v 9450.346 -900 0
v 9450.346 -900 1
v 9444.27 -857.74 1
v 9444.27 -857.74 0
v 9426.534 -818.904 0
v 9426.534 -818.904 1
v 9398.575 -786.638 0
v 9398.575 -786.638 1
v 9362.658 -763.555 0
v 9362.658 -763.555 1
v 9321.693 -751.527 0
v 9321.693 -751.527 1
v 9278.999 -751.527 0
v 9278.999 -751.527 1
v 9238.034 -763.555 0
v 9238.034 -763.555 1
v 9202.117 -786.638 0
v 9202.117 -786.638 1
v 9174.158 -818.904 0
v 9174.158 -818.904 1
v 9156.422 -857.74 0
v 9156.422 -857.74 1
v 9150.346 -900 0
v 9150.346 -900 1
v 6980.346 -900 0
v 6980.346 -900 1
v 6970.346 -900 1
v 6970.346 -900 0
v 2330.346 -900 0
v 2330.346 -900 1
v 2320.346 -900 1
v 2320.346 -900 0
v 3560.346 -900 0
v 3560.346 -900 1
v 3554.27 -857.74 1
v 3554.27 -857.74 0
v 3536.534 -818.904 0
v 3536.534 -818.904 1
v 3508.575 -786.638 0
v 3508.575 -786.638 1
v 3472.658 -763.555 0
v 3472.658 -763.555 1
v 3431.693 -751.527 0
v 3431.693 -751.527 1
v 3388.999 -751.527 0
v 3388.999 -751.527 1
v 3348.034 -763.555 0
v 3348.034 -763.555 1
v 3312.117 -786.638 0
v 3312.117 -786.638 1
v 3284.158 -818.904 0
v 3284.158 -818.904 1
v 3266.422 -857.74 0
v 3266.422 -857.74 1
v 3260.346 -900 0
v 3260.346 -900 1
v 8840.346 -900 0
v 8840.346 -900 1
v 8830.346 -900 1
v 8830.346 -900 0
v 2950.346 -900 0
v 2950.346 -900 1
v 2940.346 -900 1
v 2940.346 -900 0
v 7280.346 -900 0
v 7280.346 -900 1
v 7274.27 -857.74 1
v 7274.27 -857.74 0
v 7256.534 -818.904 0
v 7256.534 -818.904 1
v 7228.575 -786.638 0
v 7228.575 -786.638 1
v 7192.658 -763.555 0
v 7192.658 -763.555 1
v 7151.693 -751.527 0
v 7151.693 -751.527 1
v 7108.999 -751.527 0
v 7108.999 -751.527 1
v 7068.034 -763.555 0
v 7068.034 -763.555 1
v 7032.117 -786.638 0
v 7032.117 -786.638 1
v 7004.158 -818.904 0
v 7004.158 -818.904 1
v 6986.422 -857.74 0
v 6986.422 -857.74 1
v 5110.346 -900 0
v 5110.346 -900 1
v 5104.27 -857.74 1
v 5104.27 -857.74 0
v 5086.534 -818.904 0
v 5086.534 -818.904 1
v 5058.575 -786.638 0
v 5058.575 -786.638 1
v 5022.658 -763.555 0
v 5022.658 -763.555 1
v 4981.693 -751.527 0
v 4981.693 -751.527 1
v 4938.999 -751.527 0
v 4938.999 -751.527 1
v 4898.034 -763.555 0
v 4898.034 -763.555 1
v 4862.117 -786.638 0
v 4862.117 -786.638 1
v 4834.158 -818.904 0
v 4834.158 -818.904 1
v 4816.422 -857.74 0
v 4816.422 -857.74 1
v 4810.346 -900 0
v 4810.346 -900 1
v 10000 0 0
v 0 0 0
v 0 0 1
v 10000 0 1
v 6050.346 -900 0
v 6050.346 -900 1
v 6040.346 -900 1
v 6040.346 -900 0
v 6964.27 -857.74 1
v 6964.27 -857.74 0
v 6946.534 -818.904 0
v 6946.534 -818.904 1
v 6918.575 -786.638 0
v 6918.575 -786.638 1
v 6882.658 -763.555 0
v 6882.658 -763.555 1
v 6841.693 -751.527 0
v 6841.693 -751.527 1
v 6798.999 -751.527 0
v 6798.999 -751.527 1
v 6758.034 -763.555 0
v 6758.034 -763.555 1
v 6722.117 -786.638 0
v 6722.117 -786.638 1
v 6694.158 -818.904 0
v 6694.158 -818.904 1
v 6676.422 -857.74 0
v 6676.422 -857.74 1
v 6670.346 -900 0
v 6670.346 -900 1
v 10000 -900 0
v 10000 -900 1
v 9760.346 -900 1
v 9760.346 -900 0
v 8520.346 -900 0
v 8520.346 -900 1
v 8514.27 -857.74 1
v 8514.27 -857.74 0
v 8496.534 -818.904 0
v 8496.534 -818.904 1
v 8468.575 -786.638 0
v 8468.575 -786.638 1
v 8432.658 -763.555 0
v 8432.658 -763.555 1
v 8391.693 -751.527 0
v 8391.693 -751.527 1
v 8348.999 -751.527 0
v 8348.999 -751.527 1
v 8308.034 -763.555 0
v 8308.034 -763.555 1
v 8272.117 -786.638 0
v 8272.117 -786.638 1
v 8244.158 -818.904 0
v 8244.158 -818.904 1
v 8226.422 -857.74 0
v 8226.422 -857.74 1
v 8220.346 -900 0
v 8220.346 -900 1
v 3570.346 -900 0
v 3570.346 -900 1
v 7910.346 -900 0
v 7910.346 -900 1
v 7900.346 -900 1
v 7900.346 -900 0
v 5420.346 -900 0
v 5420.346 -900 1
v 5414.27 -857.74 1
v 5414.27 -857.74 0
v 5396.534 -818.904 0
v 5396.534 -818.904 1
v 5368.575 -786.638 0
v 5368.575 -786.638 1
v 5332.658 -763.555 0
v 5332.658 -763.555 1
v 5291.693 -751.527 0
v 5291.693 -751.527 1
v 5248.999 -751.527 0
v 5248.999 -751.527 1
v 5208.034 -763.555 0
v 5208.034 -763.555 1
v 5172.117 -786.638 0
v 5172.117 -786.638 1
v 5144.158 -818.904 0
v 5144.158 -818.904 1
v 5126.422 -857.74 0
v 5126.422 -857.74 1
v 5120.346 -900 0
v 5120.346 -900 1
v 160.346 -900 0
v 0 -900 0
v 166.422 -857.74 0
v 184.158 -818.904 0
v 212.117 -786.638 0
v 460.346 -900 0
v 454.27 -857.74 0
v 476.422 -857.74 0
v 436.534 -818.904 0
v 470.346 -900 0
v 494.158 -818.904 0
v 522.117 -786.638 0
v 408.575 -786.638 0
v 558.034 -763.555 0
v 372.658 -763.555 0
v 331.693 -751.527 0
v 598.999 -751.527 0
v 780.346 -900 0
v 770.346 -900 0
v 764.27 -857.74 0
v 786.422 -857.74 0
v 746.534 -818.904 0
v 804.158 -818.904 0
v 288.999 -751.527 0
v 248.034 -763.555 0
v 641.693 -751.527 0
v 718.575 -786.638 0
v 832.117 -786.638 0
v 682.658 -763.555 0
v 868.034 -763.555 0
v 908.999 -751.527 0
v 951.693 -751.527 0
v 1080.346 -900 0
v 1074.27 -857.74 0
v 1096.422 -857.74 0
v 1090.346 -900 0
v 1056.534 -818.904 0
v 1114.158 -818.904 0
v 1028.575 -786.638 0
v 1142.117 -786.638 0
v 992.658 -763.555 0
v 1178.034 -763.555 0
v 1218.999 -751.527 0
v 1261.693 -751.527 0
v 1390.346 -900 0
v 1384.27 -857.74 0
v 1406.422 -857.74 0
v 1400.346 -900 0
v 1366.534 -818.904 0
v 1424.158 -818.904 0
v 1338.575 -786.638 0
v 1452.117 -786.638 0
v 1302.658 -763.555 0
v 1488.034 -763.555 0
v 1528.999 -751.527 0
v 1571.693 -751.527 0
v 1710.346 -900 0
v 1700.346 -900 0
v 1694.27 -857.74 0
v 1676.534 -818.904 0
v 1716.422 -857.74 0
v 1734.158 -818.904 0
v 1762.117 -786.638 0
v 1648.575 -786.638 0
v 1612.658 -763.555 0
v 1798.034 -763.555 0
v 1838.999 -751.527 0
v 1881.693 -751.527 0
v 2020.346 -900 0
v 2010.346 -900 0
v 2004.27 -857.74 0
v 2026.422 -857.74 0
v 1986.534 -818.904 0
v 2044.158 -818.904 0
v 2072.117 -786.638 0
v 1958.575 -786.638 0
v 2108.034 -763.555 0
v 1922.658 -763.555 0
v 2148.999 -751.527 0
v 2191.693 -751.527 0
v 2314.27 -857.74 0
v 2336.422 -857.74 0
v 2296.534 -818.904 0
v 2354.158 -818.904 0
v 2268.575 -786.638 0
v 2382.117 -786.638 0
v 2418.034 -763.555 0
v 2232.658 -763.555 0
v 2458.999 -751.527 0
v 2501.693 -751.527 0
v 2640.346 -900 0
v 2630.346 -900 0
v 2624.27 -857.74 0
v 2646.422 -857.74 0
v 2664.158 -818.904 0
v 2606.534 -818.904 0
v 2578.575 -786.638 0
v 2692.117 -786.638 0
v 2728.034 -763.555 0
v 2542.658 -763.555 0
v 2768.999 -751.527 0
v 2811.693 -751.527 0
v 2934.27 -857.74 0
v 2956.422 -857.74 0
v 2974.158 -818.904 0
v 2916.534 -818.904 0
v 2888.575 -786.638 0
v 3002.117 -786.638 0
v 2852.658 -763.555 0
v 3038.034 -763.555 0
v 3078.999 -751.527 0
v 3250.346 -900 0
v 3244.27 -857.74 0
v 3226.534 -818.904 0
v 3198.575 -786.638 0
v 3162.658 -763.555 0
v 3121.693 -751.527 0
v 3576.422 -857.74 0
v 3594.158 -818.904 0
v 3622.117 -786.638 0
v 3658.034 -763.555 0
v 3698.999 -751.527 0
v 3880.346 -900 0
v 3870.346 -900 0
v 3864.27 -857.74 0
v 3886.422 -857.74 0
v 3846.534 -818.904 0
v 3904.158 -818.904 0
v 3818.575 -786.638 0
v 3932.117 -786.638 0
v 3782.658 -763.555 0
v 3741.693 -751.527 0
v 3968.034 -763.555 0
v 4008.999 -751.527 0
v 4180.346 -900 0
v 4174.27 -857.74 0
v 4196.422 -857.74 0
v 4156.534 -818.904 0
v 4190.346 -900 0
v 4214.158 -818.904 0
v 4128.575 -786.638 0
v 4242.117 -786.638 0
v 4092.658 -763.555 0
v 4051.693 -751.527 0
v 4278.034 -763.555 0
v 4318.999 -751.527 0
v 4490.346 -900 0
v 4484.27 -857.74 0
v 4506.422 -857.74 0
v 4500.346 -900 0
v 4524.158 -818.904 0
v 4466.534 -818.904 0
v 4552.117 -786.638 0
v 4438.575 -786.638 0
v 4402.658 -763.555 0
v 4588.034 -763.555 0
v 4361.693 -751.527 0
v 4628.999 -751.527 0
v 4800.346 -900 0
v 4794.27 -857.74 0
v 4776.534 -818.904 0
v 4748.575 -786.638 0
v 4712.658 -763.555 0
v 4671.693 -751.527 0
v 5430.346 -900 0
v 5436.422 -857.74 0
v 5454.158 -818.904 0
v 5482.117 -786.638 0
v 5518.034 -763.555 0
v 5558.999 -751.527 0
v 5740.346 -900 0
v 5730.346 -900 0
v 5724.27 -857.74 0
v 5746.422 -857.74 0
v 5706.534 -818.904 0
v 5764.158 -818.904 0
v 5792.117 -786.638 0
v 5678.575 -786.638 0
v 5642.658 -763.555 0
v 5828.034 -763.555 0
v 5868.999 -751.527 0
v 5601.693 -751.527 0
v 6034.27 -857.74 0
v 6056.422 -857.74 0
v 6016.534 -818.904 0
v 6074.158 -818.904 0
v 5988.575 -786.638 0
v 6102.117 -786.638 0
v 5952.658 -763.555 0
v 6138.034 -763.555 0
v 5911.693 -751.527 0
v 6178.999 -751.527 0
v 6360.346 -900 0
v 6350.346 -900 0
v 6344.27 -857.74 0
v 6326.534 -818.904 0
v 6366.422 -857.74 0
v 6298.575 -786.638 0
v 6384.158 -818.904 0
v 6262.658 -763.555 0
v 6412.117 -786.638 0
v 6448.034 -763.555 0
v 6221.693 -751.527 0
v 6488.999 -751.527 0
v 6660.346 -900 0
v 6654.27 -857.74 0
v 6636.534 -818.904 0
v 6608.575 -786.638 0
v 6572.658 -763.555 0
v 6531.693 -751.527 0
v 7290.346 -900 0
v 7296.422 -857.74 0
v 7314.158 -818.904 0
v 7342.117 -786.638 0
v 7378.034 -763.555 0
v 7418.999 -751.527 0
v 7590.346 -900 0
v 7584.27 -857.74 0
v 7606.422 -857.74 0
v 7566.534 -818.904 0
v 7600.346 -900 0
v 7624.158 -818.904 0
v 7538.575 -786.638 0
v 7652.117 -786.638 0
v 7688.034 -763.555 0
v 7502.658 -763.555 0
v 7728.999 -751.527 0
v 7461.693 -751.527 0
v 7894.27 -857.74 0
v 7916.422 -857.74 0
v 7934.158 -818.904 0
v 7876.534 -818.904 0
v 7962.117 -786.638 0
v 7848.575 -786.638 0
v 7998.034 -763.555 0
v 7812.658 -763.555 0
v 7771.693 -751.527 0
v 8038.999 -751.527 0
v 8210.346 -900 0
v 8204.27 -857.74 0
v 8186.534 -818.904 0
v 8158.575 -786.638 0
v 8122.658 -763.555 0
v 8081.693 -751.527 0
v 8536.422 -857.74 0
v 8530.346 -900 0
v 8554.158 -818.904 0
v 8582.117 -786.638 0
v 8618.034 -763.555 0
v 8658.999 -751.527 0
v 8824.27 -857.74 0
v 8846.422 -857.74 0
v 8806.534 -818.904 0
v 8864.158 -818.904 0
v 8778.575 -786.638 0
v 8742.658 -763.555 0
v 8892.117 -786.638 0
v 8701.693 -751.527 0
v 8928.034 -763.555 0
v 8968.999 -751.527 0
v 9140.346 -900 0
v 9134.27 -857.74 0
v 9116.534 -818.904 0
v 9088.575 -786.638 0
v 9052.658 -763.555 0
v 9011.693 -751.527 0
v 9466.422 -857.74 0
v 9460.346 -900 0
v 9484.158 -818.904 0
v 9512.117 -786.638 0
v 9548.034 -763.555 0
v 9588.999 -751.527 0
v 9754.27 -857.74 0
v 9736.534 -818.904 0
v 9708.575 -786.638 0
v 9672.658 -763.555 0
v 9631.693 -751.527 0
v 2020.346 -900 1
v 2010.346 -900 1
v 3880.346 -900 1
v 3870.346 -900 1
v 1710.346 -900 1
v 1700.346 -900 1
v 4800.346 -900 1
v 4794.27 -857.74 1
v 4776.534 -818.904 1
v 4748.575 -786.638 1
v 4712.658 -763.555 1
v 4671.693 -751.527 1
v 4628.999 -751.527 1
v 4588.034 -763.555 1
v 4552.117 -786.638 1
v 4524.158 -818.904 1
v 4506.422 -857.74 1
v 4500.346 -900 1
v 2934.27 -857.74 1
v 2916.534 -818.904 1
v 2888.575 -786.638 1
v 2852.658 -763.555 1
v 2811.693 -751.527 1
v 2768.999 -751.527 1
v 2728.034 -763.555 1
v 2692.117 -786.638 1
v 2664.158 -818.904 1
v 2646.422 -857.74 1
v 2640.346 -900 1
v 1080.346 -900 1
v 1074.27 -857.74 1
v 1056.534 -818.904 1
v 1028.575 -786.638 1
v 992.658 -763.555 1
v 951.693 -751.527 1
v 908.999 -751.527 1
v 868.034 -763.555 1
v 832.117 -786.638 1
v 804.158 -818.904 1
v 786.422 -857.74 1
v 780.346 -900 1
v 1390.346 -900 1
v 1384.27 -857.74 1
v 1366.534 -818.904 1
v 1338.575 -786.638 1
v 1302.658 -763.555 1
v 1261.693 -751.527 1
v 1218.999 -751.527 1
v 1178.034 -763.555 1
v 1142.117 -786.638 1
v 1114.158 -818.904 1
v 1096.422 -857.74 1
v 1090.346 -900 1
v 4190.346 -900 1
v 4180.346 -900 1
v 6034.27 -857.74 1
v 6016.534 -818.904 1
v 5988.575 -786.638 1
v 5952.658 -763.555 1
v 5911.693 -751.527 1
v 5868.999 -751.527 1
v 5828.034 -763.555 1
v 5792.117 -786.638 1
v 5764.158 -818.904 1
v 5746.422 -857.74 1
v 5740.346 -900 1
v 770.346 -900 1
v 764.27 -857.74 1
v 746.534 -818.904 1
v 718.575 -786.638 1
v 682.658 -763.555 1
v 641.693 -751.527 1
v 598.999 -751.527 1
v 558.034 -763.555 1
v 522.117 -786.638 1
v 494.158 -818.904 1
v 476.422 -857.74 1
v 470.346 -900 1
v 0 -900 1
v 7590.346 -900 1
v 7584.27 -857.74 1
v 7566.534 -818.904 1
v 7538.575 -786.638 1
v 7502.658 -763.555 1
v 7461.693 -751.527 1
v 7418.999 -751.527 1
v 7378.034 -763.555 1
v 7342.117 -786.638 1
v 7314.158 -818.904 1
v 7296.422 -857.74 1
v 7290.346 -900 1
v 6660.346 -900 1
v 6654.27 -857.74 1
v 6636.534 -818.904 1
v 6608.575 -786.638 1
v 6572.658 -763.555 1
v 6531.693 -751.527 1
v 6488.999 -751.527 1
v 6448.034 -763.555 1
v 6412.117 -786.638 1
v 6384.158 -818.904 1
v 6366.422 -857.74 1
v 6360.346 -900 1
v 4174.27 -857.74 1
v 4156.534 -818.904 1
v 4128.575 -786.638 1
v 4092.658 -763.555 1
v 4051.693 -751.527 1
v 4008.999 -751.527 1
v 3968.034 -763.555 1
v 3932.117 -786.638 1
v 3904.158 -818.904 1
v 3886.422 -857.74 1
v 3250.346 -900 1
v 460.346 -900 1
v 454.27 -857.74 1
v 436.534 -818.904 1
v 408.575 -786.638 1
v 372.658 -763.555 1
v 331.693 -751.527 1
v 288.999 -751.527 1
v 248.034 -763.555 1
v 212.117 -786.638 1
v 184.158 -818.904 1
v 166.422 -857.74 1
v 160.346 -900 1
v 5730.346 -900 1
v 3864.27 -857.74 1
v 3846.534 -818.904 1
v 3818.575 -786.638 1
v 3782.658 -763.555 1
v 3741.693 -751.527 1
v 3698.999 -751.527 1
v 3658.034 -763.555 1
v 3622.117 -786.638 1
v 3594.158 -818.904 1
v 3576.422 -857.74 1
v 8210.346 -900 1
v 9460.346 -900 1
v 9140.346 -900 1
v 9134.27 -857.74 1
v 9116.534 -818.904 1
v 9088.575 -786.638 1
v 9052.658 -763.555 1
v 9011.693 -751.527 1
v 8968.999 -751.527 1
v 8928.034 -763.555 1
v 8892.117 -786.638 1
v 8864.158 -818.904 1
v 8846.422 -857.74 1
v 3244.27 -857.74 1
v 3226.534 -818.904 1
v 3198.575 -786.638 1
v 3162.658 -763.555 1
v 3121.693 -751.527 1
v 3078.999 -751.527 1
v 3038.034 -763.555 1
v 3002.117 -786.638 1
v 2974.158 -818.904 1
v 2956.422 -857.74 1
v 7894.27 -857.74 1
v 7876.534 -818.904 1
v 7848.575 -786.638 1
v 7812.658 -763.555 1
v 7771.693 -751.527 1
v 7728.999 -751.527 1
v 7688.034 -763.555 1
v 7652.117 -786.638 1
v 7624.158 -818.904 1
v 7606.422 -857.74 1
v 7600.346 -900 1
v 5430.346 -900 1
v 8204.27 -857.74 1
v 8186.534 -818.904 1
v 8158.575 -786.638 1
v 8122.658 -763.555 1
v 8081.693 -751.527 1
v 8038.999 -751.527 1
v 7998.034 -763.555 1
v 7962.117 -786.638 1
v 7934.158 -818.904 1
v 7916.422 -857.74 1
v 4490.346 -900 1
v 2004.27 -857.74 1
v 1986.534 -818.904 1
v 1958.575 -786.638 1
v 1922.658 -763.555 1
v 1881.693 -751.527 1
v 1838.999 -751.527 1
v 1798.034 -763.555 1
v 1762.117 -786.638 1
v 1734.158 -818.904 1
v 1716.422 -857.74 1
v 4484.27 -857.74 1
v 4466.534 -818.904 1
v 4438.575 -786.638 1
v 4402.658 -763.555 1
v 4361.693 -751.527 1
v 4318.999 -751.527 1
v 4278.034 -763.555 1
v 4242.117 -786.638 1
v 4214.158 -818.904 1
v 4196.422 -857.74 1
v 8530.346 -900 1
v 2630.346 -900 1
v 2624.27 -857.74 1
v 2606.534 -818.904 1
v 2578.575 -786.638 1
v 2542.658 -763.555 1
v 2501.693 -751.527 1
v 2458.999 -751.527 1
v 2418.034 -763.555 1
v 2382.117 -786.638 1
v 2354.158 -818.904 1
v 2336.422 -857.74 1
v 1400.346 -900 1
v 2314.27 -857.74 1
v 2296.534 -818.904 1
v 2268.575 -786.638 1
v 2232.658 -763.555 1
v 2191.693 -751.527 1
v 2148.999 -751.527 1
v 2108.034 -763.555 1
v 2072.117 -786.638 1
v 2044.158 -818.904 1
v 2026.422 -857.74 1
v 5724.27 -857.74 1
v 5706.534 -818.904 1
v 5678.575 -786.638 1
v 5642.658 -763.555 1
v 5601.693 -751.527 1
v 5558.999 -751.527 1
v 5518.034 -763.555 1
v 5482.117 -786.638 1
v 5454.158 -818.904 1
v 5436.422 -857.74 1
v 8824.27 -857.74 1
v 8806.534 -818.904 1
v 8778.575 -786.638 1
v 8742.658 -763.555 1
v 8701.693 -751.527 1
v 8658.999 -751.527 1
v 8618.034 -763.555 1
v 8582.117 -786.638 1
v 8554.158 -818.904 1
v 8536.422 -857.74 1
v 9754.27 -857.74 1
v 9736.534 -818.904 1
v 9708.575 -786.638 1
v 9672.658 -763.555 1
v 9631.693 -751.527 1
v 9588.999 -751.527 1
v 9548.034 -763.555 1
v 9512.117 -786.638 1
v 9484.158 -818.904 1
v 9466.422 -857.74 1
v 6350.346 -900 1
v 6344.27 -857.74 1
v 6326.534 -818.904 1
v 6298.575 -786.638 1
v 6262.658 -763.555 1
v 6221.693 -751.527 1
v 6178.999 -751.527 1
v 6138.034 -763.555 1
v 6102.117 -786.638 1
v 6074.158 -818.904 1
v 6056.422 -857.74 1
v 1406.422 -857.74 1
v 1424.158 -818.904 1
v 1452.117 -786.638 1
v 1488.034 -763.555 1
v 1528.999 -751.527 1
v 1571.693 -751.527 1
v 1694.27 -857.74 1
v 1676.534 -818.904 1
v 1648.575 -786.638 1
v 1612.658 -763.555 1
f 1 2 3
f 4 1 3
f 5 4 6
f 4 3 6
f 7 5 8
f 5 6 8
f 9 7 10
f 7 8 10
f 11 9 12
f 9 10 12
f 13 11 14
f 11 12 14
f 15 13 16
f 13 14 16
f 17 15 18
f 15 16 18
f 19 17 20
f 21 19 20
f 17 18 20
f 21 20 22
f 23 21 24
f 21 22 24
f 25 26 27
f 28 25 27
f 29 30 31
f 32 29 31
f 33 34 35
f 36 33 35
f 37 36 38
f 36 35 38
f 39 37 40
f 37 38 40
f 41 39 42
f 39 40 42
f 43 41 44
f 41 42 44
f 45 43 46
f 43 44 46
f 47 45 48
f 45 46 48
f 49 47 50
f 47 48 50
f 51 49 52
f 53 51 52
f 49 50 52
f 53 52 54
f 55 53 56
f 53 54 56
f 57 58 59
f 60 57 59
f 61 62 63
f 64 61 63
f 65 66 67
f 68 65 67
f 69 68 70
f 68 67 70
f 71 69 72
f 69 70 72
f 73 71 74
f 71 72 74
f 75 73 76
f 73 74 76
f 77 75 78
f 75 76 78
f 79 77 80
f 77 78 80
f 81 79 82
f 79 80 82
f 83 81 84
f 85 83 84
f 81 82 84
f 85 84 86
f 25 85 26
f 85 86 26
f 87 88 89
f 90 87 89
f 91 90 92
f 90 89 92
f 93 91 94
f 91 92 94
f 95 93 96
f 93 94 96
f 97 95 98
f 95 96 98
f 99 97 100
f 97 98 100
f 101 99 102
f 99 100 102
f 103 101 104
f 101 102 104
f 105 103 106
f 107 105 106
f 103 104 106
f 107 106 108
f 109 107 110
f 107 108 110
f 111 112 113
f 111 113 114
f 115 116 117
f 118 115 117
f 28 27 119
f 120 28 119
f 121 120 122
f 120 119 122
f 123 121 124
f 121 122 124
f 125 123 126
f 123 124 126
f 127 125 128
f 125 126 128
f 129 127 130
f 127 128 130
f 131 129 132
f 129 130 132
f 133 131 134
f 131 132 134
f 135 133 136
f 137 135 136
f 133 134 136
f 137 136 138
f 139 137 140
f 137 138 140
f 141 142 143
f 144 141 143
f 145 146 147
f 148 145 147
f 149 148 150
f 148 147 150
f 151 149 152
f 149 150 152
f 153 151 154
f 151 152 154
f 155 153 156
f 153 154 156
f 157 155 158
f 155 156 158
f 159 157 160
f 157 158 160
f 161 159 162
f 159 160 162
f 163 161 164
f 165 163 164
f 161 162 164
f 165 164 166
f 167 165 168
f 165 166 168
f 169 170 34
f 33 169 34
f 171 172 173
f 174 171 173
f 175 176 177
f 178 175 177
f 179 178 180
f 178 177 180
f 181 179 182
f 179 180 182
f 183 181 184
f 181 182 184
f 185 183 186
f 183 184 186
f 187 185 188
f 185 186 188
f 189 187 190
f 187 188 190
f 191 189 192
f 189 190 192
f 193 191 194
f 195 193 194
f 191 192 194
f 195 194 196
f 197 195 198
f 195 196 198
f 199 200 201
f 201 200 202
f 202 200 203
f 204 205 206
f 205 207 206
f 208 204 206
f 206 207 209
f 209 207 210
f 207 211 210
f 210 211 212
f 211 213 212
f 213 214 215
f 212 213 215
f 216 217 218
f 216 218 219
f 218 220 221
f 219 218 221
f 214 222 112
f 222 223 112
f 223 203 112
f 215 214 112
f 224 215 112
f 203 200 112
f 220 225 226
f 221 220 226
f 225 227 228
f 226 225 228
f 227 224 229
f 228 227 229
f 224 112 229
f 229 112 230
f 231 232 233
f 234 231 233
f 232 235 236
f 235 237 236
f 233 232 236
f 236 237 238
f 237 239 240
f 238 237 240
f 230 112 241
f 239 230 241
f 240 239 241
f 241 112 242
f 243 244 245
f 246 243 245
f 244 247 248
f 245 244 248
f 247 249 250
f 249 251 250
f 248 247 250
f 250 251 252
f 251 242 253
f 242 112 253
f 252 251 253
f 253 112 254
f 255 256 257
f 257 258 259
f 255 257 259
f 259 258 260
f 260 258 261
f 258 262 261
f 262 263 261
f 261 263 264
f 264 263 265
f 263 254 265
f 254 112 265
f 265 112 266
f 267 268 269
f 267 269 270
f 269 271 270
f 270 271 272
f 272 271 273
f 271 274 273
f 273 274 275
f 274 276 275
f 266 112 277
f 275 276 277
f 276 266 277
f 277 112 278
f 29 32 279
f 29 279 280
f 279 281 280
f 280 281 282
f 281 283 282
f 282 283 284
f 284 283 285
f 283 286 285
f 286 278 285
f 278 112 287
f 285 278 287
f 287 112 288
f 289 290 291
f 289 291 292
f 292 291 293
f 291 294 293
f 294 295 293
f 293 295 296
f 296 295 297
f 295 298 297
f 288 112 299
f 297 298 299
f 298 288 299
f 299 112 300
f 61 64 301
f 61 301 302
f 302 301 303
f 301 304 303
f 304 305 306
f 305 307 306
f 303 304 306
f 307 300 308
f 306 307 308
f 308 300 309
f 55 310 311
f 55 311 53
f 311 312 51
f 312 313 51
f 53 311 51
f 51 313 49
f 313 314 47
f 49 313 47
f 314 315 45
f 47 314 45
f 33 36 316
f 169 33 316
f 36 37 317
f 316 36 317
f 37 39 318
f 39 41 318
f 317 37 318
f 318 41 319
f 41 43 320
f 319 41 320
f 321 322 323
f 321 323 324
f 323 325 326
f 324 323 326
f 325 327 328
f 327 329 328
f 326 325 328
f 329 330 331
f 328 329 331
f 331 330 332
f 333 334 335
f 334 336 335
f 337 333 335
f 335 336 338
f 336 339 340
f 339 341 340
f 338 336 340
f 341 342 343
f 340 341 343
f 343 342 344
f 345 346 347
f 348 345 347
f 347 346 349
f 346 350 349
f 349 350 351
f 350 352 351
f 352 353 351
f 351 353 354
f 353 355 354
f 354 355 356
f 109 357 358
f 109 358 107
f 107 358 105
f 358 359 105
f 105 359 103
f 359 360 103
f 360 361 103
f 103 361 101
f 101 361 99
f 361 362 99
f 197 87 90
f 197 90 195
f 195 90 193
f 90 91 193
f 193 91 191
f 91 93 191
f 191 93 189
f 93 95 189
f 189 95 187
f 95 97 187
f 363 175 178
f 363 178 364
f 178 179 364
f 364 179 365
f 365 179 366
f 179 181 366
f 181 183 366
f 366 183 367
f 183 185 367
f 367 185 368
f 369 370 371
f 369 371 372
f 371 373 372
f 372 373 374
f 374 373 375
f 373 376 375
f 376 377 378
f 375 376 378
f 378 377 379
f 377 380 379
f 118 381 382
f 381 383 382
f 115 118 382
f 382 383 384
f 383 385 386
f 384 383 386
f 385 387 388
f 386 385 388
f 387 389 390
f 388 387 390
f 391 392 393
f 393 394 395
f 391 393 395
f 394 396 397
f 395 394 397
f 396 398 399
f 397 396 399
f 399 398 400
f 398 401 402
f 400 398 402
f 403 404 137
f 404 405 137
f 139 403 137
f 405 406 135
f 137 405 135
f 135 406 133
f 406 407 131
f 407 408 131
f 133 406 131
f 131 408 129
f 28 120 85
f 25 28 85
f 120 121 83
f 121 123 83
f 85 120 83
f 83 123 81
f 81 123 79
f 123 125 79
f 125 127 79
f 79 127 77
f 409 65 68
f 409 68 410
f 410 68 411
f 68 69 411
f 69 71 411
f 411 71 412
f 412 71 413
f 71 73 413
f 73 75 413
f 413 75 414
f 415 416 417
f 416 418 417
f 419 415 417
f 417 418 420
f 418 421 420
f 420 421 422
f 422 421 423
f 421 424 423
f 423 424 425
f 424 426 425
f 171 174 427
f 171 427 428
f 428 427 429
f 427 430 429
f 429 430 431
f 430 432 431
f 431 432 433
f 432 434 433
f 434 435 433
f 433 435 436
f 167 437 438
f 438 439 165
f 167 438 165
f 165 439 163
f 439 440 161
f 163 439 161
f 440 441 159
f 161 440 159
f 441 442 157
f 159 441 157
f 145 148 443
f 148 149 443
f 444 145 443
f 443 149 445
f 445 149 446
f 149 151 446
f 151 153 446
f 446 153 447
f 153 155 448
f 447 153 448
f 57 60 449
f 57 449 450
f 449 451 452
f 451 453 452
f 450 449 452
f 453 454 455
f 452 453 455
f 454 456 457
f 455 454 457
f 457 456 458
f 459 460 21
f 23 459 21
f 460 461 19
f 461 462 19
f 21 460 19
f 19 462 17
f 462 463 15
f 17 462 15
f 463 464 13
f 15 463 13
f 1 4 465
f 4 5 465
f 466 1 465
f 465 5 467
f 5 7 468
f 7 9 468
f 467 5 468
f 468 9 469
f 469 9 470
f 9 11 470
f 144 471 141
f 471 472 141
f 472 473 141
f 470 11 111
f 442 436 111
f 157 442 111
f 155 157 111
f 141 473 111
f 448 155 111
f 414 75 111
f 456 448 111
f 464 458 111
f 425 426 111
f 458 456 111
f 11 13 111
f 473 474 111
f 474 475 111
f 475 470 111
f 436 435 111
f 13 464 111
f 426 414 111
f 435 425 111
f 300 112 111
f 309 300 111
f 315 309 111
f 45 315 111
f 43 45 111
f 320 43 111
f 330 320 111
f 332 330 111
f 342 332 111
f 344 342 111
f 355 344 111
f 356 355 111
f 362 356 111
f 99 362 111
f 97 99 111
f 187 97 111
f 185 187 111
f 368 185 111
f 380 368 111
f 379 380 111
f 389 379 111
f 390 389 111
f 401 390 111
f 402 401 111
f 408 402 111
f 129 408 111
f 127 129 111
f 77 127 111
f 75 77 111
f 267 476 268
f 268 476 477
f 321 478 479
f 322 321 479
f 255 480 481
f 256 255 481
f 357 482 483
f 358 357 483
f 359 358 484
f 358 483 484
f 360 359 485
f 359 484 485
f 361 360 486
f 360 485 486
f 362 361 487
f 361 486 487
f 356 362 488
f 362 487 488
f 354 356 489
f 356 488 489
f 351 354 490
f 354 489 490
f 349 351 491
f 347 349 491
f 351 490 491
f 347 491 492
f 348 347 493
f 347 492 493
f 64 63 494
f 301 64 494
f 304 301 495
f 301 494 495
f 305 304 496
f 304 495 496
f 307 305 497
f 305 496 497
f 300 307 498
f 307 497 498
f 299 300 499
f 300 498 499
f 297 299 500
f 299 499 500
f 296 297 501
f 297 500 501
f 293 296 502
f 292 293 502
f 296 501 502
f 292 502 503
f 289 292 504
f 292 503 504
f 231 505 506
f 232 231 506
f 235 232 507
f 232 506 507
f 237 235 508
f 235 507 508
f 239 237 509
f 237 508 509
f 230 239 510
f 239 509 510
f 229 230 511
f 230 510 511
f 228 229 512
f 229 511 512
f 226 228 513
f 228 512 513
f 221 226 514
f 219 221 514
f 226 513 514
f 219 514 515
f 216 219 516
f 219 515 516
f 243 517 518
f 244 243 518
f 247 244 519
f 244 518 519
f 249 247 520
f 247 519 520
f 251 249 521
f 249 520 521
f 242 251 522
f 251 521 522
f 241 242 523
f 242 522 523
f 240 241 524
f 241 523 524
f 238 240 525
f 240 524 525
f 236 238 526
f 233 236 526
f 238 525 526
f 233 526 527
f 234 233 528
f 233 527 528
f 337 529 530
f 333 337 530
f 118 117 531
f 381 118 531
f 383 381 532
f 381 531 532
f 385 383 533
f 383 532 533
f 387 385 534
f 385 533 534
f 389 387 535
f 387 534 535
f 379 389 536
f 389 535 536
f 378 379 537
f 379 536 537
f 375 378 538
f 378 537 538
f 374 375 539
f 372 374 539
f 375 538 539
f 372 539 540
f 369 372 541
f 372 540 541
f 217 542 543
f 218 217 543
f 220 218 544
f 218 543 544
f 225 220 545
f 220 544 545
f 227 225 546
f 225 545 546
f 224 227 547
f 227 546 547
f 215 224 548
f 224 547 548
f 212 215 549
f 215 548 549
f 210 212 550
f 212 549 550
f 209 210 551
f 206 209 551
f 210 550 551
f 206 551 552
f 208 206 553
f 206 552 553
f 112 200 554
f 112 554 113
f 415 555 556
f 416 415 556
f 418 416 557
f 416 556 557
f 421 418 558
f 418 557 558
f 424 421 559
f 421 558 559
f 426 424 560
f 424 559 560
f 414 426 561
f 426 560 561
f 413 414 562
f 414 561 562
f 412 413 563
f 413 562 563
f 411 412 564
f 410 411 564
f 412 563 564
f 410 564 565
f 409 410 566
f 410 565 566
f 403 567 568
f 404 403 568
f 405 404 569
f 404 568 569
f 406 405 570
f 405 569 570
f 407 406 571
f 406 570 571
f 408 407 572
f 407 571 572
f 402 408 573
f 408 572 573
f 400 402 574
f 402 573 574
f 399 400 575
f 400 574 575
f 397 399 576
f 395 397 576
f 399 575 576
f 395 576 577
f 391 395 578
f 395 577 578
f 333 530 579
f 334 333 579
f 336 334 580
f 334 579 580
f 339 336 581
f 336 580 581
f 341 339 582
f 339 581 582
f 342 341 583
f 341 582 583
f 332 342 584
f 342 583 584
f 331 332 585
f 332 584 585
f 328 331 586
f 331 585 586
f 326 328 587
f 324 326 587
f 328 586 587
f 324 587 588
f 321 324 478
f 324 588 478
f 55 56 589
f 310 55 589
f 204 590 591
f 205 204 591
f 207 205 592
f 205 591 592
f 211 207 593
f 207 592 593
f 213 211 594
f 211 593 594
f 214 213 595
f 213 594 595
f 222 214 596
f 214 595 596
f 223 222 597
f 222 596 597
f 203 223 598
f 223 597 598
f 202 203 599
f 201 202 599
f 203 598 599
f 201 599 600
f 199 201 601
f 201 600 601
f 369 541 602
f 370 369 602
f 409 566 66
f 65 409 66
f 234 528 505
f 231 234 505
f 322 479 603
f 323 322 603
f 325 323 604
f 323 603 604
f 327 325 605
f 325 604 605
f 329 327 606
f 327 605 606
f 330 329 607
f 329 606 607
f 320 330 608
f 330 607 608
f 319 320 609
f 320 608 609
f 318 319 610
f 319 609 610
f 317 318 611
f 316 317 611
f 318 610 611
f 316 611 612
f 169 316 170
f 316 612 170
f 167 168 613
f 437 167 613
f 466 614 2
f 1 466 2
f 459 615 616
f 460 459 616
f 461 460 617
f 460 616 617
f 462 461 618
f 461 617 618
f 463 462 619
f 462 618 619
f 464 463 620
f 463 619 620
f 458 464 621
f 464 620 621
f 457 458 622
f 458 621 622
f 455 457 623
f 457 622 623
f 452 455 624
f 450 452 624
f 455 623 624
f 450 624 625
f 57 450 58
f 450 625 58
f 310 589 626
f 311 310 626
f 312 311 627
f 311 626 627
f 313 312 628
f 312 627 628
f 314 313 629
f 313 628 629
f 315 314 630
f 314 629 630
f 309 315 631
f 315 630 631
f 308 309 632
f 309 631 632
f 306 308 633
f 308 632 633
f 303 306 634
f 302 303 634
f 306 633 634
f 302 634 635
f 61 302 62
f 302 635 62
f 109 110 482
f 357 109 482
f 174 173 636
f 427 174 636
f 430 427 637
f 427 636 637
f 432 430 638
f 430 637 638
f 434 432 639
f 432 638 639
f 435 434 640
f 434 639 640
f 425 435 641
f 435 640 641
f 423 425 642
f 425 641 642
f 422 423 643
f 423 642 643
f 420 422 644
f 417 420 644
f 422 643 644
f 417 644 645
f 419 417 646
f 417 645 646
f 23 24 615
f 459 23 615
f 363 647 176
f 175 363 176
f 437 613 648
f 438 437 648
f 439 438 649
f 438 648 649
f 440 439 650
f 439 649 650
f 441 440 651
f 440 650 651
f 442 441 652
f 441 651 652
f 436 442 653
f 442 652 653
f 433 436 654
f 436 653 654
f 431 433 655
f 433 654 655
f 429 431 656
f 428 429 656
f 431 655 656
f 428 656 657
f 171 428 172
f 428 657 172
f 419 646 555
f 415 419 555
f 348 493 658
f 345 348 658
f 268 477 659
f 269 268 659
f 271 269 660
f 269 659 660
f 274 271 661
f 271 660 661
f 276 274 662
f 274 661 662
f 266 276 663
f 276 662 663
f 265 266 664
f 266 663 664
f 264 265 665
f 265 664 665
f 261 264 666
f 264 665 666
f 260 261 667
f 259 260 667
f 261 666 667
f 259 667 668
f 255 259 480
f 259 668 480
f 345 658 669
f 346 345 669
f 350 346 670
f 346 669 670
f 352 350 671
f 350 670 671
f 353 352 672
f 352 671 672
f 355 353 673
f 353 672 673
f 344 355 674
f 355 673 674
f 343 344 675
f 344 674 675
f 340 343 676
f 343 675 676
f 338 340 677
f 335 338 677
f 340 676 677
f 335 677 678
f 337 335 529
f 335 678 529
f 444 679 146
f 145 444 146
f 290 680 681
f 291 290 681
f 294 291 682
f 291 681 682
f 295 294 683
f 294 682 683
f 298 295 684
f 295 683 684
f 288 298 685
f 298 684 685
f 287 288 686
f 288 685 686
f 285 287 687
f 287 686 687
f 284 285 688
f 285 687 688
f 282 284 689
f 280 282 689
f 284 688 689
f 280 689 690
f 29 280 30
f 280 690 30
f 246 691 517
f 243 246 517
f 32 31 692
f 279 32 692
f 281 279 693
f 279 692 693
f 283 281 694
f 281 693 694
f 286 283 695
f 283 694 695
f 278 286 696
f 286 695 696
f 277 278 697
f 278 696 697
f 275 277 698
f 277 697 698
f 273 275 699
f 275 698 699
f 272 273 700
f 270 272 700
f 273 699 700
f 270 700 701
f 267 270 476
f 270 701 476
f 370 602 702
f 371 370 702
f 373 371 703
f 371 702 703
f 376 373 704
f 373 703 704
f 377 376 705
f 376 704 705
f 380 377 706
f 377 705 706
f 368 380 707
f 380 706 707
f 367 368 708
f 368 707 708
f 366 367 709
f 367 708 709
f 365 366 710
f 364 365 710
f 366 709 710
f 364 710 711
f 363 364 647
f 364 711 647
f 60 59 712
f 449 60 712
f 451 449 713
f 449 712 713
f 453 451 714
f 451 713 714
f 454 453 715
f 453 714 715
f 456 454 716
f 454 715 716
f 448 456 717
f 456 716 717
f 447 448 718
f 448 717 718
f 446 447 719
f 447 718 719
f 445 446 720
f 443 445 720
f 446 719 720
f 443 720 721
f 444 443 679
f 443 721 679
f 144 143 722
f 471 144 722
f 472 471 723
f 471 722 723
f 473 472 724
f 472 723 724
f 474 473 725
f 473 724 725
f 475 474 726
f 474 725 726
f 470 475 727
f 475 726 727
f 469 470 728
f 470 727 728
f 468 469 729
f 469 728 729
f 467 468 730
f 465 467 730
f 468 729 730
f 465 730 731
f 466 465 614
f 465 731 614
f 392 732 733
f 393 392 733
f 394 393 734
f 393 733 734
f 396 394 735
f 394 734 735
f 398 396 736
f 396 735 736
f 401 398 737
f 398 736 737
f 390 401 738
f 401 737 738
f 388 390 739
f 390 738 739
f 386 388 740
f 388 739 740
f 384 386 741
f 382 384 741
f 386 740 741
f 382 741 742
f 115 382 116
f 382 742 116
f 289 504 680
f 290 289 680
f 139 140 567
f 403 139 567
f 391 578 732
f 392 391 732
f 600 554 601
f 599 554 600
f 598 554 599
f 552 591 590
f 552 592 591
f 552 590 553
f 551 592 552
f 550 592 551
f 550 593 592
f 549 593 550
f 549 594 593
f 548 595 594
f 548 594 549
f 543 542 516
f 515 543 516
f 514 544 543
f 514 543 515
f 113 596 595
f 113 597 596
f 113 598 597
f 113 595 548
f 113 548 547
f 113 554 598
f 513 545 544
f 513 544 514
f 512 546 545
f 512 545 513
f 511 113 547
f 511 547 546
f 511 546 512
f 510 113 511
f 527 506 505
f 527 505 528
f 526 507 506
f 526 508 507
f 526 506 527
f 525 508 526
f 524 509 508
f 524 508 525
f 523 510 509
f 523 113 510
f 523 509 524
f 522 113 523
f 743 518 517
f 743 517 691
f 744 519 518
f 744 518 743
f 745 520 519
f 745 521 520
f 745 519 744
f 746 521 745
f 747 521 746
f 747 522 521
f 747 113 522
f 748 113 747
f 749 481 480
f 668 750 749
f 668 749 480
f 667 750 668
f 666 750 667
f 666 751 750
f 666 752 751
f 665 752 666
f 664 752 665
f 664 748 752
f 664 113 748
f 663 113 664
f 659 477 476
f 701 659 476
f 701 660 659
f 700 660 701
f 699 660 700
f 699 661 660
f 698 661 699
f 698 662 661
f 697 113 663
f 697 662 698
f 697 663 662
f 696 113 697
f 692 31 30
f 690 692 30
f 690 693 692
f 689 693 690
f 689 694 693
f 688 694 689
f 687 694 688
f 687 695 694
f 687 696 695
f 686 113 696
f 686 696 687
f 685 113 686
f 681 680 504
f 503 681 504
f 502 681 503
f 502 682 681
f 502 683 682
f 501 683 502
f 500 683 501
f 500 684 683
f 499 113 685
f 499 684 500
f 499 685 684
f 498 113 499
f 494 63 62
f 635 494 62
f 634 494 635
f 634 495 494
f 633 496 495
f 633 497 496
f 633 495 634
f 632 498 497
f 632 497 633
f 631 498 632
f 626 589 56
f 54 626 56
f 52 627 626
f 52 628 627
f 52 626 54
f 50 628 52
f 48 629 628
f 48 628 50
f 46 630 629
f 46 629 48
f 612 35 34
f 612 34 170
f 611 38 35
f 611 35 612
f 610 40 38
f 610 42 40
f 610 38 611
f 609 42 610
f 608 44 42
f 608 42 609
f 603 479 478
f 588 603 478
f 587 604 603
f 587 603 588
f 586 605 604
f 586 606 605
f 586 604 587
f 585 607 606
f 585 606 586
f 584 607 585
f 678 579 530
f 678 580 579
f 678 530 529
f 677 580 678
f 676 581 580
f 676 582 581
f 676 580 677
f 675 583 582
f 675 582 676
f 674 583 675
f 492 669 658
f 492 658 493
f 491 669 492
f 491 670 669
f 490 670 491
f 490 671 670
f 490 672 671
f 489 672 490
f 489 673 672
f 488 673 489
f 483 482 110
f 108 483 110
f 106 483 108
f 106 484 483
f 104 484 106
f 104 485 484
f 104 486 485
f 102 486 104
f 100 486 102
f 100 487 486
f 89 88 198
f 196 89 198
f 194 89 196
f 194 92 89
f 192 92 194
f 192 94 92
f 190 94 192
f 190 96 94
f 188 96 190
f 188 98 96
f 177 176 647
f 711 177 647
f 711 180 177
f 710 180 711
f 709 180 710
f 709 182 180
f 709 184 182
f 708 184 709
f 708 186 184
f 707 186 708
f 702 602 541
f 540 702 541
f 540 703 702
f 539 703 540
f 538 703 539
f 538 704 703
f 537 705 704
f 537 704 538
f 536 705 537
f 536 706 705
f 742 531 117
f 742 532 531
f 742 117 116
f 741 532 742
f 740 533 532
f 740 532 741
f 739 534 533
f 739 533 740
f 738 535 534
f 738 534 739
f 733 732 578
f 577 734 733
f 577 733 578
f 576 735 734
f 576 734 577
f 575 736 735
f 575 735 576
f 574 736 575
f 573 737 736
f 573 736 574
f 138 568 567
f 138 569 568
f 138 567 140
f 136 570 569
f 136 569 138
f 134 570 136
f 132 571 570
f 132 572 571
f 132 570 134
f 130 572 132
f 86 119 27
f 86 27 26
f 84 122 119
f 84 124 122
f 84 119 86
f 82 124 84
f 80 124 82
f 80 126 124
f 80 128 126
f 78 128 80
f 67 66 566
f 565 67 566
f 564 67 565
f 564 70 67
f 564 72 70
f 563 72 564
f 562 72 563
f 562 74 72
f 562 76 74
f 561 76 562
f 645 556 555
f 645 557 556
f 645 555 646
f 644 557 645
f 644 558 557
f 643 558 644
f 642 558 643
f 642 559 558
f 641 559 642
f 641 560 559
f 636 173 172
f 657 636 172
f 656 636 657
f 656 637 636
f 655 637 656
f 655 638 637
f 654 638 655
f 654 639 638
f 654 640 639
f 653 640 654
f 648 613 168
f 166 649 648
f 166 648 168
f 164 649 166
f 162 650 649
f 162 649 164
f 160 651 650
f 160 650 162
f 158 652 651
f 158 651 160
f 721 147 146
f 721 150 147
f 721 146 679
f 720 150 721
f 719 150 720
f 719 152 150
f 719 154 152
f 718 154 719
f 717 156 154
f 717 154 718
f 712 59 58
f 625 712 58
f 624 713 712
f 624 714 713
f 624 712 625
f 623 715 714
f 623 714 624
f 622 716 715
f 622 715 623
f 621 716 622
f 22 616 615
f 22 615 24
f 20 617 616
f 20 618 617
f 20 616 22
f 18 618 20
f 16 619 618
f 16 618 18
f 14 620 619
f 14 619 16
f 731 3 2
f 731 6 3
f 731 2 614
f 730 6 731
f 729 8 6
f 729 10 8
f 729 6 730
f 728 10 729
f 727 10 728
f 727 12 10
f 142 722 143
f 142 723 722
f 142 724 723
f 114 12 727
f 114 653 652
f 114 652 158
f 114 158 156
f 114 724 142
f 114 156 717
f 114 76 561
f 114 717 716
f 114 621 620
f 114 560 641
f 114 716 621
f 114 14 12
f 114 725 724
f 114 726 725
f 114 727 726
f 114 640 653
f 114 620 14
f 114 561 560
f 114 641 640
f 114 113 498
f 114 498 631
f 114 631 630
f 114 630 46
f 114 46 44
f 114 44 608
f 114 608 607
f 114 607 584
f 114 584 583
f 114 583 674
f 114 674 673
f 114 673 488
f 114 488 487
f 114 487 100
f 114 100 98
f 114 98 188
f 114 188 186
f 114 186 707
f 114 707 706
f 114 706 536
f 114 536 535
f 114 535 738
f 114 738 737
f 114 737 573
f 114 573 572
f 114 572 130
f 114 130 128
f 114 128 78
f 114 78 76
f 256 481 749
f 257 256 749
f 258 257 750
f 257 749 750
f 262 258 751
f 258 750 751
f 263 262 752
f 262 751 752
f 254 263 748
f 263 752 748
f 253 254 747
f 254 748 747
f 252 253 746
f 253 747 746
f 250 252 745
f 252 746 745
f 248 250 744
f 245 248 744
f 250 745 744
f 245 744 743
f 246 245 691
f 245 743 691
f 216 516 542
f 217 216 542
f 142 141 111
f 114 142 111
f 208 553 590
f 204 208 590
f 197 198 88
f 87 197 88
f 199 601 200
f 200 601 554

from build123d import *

# Parameters (mm, degrees)
F0_W     = 10000
F0_H     = 1800
F1_DEPTH = 1
F2_R     = 150
F3_DEPTH = 1.001
F5_DEPTH = 1.001


with BuildPart() as f1:
    # F0 (on Top) → F1 (new body)
    with BuildSketch(Plane.XY):
        with Locations((5000, -900)):
            Rectangle(F0_W, F0_H)
    extrude(amount=F1_DEPTH)

    # F2 (on face) → F3 (cut, through all)
    with BuildSketch(Plane.XY.offset(1)):
        with Locations((310.346186161, -900)):
            Circle(F2_R)
        with Locations((620.346186161, -900)):
            Circle(F2_R)
        with Locations((930.346186161, -900)):
            Circle(F2_R)
        with Locations((1240.346186161, -900)):
            Circle(F2_R)
        with Locations((1550.346186161, -900)):
            Circle(F2_R)
        with Locations((1860.346186161, -900)):
            Circle(F2_R)
        with Locations((2170.346186161, -900)):
            Circle(F2_R)
        with Locations((2480.346186161, -900)):
            Circle(F2_R)
        with Locations((2790.346186161, -900)):
            Circle(F2_R)
        with Locations((3100.346186161, -900)):
            Circle(F2_R)
        with Locations((3410.346186161, -900)):
            Circle(F2_R)
        with Locations((3720.346186161, -900)):
            Circle(F2_R)
        with Locations((4030.346186161, -900)):
            Circle(F2_R)
        with Locations((4340.346186161, -900)):
            Circle(F2_R)
        with Locations((4650.346186161, -900)):
            Circle(F2_R)
        with Locations((4960.346186161, -900)):
            Circle(F2_R)
        with Locations((5270.346186161, -900)):
            Circle(F2_R)
        with Locations((5580.346186161, -900)):
            Circle(F2_R)
        with Locations((5890.346186161, -900)):
            Circle(F2_R)
        with Locations((6200.346186161, -900)):
            Circle(F2_R)
        with Locations((6510.346186161, -900)):
            Circle(F2_R)
        with Locations((6820.346186161, -900)):
            Circle(F2_R)
        with Locations((7130.346186161, -900)):
            Circle(F2_R)
        with Locations((7440.346186161, -900)):
            Circle(F2_R)
        with Locations((7750.346186161, -900)):
            Circle(F2_R)
        with Locations((8060.346186161, -900)):
            Circle(F2_R)
        with Locations((8370.346186161, -900)):
            Circle(F2_R)
        with Locations((8680.346186161, -900)):
            Circle(F2_R)
        with Locations((8990.346186161, -900)):
            Circle(F2_R)
        with Locations((9300.346186161, -900)):
            Circle(F2_R)
        with Locations((9610.346186161, -900)):
            Circle(F2_R)
    extrude(amount=-F3_DEPTH, mode=Mode.SUBTRACT)

    # F4 (on face) → F5 (cut, through all)
    with BuildSketch(Plane.XY.offset(1)):
        with BuildLine():
            Line((10000, -900), (9760.346186161, -900))
            ThreePointArc((9760.346186161, -900), (9610.346186161, -1050), (9460.346186161, -900))
            Line((9460.346186161, -900), (9450.346186161, -900))
            ThreePointArc((9450.346186161, -900), (9300.346186161, -1050), (9150.346186161, -900))
            Line((9150.346186161, -900), (9140.346186161, -900))
            ThreePointArc((9140.346186161, -900), (8990.346186161, -1050), (8840.346186161, -900))
            Line((8840.346186161, -900), (8830.346186161, -900))
            ThreePointArc((8830.346186161, -900), (8680.346186161, -1050), (8530.346186161, -900))
            Line((8530.346186161, -900), (8520.346186161, -900))
            ThreePointArc((8520.346186161, -900), (8370.346186161, -1050), (8220.346186161, -900))
            Line((8220.346186161, -900), (8210.346186161, -900))
            ThreePointArc((8210.346186161, -900), (8060.346186161, -1050), (7910.346186161, -900))
            Line((7910.346186161, -900), (7900.346186161, -900))
            ThreePointArc((7900.346186161, -900), (7750.346186161, -1050), (7600.346186161, -900))
            Line((7600.346186161, -900), (7590.346186161, -900))
            ThreePointArc((7590.346186161, -900), (7440.346186161, -1050), (7290.346186161, -900))
            Line((7290.346186161, -900), (7280.346186161, -900))
            ThreePointArc((7280.346186161, -900), (7130.346186161, -1050), (6980.346186161, -900))
            Line((6980.346186161, -900), (6970.346186161, -900))
            ThreePointArc((6970.346186161, -900), (6820.346186161, -1050), (6670.346186161, -900))
            Line((6670.346186161, -900), (6660.346186161, -900))
            ThreePointArc((6660.346186161, -900), (6510.346186161, -1050), (6360.346186161, -900))
            Line((6360.346186161, -900), (6350.346186161, -900))
            ThreePointArc((6350.346186161, -900), (6200.346186161, -1050), (6050.346186161, -900))
            Line((6050.346186161, -900), (6040.346186161, -900))
            ThreePointArc((6040.346186161, -900), (5890.346186161, -1050), (5740.346186161, -900))
            Line((5740.346186161, -900), (5730.346186161, -900))
            ThreePointArc((5730.346186161, -900), (5580.346186161, -1050), (5430.346186161, -900))
            Line((5430.346186161, -900), (5420.346186161, -900))
            ThreePointArc((5420.346186161, -900), (5270.346186161, -1050), (5120.346186161, -900))
            Line((5120.346186161, -900), (5110.346186161, -900))
            ThreePointArc((5110.346186161, -900), (4960.346186161, -1050), (4810.346186161, -900))
            Line((4810.346186161, -900), (4800.346186161, -900))
            ThreePointArc((4800.346186161, -900), (4650.346186161, -1050), (4500.346186161, -900))
            Line((4500.346186161, -900), (4490.346186161, -900))
            ThreePointArc((4490.346186161, -900), (4340.346186161, -1050), (4190.346186161, -900))
            Line((4190.346186161, -900), (4180.346186161, -900))
            ThreePointArc((4180.346186161, -900), (4030.346186161, -1050), (3880.346186161, -900))
            Line((3880.346186161, -900), (3870.346186161, -900))
            ThreePointArc((3870.346186161, -900), (3720.346186161, -1050), (3570.346186161, -900))
            Line((3570.346186161, -900), (3560.346186161, -900))
            ThreePointArc((3560.346186161, -900), (3410.346186161, -1050), (3260.346186161, -900))
            Line((3260.346186161, -900), (3250.346186161, -900))
            ThreePointArc((3250.346186161, -900), (3100.346186161, -1050), (2950.346186161, -900))
            Line((2950.346186161, -900), (2940.346186161, -900))
            ThreePointArc((2940.346186161, -900), (2790.346186161, -1050), (2640.346186161, -900))
            Line((2640.346186161, -900), (2630.346186161, -900))
            ThreePointArc((2630.346186161, -900), (2480.346186161, -1050), (2330.346186161, -900))
            Line((2330.346186161, -900), (2320.346186161, -900))
            ThreePointArc((2320.346186161, -900), (2170.346186161, -1050), (2020.346186161, -900))
            Line((2020.346186161, -900), (2010.346186161, -900))
            ThreePointArc((2010.346186161, -900), (1860.346186161, -1050), (1710.346186161, -900))
            Line((1710.346186161, -900), (1700.346186161, -900))
            ThreePointArc((1700.346186161, -900), (1550.346186161, -1050), (1400.346186161, -900))
            Line((1400.346186161, -900), (1390.346186161, -900))
            ThreePointArc((1390.346186161, -900), (1240.346186161, -1050), (1090.346186161, -900))
            Line((1090.346186161, -900), (1080.346186161, -900))
            ThreePointArc((1080.346186161, -900), (930.346186161, -1050), (780.346186161, -900))
            Line((780.346186161, -900), (770.346186161, -900))
            ThreePointArc((770.346186161, -900), (620.346186161, -1050), (470.346186161, -900))
            Line((470.346186161, -900), (460.346186161, -900))
            ThreePointArc((460.346186161, -900), (310.346186161, -1050), (160.346186161, -900))
            Line((160.346186161, -900), (0, -900))
            Line((0, -900), (0, -1800))
            Line((0, -1800), (10000, -1800))
            Line((10000, -1800), (10000, -900))
        make_face()
    extrude(amount=-F5_DEPTH, mode=Mode.SUBTRACT)


solid = f1.part
